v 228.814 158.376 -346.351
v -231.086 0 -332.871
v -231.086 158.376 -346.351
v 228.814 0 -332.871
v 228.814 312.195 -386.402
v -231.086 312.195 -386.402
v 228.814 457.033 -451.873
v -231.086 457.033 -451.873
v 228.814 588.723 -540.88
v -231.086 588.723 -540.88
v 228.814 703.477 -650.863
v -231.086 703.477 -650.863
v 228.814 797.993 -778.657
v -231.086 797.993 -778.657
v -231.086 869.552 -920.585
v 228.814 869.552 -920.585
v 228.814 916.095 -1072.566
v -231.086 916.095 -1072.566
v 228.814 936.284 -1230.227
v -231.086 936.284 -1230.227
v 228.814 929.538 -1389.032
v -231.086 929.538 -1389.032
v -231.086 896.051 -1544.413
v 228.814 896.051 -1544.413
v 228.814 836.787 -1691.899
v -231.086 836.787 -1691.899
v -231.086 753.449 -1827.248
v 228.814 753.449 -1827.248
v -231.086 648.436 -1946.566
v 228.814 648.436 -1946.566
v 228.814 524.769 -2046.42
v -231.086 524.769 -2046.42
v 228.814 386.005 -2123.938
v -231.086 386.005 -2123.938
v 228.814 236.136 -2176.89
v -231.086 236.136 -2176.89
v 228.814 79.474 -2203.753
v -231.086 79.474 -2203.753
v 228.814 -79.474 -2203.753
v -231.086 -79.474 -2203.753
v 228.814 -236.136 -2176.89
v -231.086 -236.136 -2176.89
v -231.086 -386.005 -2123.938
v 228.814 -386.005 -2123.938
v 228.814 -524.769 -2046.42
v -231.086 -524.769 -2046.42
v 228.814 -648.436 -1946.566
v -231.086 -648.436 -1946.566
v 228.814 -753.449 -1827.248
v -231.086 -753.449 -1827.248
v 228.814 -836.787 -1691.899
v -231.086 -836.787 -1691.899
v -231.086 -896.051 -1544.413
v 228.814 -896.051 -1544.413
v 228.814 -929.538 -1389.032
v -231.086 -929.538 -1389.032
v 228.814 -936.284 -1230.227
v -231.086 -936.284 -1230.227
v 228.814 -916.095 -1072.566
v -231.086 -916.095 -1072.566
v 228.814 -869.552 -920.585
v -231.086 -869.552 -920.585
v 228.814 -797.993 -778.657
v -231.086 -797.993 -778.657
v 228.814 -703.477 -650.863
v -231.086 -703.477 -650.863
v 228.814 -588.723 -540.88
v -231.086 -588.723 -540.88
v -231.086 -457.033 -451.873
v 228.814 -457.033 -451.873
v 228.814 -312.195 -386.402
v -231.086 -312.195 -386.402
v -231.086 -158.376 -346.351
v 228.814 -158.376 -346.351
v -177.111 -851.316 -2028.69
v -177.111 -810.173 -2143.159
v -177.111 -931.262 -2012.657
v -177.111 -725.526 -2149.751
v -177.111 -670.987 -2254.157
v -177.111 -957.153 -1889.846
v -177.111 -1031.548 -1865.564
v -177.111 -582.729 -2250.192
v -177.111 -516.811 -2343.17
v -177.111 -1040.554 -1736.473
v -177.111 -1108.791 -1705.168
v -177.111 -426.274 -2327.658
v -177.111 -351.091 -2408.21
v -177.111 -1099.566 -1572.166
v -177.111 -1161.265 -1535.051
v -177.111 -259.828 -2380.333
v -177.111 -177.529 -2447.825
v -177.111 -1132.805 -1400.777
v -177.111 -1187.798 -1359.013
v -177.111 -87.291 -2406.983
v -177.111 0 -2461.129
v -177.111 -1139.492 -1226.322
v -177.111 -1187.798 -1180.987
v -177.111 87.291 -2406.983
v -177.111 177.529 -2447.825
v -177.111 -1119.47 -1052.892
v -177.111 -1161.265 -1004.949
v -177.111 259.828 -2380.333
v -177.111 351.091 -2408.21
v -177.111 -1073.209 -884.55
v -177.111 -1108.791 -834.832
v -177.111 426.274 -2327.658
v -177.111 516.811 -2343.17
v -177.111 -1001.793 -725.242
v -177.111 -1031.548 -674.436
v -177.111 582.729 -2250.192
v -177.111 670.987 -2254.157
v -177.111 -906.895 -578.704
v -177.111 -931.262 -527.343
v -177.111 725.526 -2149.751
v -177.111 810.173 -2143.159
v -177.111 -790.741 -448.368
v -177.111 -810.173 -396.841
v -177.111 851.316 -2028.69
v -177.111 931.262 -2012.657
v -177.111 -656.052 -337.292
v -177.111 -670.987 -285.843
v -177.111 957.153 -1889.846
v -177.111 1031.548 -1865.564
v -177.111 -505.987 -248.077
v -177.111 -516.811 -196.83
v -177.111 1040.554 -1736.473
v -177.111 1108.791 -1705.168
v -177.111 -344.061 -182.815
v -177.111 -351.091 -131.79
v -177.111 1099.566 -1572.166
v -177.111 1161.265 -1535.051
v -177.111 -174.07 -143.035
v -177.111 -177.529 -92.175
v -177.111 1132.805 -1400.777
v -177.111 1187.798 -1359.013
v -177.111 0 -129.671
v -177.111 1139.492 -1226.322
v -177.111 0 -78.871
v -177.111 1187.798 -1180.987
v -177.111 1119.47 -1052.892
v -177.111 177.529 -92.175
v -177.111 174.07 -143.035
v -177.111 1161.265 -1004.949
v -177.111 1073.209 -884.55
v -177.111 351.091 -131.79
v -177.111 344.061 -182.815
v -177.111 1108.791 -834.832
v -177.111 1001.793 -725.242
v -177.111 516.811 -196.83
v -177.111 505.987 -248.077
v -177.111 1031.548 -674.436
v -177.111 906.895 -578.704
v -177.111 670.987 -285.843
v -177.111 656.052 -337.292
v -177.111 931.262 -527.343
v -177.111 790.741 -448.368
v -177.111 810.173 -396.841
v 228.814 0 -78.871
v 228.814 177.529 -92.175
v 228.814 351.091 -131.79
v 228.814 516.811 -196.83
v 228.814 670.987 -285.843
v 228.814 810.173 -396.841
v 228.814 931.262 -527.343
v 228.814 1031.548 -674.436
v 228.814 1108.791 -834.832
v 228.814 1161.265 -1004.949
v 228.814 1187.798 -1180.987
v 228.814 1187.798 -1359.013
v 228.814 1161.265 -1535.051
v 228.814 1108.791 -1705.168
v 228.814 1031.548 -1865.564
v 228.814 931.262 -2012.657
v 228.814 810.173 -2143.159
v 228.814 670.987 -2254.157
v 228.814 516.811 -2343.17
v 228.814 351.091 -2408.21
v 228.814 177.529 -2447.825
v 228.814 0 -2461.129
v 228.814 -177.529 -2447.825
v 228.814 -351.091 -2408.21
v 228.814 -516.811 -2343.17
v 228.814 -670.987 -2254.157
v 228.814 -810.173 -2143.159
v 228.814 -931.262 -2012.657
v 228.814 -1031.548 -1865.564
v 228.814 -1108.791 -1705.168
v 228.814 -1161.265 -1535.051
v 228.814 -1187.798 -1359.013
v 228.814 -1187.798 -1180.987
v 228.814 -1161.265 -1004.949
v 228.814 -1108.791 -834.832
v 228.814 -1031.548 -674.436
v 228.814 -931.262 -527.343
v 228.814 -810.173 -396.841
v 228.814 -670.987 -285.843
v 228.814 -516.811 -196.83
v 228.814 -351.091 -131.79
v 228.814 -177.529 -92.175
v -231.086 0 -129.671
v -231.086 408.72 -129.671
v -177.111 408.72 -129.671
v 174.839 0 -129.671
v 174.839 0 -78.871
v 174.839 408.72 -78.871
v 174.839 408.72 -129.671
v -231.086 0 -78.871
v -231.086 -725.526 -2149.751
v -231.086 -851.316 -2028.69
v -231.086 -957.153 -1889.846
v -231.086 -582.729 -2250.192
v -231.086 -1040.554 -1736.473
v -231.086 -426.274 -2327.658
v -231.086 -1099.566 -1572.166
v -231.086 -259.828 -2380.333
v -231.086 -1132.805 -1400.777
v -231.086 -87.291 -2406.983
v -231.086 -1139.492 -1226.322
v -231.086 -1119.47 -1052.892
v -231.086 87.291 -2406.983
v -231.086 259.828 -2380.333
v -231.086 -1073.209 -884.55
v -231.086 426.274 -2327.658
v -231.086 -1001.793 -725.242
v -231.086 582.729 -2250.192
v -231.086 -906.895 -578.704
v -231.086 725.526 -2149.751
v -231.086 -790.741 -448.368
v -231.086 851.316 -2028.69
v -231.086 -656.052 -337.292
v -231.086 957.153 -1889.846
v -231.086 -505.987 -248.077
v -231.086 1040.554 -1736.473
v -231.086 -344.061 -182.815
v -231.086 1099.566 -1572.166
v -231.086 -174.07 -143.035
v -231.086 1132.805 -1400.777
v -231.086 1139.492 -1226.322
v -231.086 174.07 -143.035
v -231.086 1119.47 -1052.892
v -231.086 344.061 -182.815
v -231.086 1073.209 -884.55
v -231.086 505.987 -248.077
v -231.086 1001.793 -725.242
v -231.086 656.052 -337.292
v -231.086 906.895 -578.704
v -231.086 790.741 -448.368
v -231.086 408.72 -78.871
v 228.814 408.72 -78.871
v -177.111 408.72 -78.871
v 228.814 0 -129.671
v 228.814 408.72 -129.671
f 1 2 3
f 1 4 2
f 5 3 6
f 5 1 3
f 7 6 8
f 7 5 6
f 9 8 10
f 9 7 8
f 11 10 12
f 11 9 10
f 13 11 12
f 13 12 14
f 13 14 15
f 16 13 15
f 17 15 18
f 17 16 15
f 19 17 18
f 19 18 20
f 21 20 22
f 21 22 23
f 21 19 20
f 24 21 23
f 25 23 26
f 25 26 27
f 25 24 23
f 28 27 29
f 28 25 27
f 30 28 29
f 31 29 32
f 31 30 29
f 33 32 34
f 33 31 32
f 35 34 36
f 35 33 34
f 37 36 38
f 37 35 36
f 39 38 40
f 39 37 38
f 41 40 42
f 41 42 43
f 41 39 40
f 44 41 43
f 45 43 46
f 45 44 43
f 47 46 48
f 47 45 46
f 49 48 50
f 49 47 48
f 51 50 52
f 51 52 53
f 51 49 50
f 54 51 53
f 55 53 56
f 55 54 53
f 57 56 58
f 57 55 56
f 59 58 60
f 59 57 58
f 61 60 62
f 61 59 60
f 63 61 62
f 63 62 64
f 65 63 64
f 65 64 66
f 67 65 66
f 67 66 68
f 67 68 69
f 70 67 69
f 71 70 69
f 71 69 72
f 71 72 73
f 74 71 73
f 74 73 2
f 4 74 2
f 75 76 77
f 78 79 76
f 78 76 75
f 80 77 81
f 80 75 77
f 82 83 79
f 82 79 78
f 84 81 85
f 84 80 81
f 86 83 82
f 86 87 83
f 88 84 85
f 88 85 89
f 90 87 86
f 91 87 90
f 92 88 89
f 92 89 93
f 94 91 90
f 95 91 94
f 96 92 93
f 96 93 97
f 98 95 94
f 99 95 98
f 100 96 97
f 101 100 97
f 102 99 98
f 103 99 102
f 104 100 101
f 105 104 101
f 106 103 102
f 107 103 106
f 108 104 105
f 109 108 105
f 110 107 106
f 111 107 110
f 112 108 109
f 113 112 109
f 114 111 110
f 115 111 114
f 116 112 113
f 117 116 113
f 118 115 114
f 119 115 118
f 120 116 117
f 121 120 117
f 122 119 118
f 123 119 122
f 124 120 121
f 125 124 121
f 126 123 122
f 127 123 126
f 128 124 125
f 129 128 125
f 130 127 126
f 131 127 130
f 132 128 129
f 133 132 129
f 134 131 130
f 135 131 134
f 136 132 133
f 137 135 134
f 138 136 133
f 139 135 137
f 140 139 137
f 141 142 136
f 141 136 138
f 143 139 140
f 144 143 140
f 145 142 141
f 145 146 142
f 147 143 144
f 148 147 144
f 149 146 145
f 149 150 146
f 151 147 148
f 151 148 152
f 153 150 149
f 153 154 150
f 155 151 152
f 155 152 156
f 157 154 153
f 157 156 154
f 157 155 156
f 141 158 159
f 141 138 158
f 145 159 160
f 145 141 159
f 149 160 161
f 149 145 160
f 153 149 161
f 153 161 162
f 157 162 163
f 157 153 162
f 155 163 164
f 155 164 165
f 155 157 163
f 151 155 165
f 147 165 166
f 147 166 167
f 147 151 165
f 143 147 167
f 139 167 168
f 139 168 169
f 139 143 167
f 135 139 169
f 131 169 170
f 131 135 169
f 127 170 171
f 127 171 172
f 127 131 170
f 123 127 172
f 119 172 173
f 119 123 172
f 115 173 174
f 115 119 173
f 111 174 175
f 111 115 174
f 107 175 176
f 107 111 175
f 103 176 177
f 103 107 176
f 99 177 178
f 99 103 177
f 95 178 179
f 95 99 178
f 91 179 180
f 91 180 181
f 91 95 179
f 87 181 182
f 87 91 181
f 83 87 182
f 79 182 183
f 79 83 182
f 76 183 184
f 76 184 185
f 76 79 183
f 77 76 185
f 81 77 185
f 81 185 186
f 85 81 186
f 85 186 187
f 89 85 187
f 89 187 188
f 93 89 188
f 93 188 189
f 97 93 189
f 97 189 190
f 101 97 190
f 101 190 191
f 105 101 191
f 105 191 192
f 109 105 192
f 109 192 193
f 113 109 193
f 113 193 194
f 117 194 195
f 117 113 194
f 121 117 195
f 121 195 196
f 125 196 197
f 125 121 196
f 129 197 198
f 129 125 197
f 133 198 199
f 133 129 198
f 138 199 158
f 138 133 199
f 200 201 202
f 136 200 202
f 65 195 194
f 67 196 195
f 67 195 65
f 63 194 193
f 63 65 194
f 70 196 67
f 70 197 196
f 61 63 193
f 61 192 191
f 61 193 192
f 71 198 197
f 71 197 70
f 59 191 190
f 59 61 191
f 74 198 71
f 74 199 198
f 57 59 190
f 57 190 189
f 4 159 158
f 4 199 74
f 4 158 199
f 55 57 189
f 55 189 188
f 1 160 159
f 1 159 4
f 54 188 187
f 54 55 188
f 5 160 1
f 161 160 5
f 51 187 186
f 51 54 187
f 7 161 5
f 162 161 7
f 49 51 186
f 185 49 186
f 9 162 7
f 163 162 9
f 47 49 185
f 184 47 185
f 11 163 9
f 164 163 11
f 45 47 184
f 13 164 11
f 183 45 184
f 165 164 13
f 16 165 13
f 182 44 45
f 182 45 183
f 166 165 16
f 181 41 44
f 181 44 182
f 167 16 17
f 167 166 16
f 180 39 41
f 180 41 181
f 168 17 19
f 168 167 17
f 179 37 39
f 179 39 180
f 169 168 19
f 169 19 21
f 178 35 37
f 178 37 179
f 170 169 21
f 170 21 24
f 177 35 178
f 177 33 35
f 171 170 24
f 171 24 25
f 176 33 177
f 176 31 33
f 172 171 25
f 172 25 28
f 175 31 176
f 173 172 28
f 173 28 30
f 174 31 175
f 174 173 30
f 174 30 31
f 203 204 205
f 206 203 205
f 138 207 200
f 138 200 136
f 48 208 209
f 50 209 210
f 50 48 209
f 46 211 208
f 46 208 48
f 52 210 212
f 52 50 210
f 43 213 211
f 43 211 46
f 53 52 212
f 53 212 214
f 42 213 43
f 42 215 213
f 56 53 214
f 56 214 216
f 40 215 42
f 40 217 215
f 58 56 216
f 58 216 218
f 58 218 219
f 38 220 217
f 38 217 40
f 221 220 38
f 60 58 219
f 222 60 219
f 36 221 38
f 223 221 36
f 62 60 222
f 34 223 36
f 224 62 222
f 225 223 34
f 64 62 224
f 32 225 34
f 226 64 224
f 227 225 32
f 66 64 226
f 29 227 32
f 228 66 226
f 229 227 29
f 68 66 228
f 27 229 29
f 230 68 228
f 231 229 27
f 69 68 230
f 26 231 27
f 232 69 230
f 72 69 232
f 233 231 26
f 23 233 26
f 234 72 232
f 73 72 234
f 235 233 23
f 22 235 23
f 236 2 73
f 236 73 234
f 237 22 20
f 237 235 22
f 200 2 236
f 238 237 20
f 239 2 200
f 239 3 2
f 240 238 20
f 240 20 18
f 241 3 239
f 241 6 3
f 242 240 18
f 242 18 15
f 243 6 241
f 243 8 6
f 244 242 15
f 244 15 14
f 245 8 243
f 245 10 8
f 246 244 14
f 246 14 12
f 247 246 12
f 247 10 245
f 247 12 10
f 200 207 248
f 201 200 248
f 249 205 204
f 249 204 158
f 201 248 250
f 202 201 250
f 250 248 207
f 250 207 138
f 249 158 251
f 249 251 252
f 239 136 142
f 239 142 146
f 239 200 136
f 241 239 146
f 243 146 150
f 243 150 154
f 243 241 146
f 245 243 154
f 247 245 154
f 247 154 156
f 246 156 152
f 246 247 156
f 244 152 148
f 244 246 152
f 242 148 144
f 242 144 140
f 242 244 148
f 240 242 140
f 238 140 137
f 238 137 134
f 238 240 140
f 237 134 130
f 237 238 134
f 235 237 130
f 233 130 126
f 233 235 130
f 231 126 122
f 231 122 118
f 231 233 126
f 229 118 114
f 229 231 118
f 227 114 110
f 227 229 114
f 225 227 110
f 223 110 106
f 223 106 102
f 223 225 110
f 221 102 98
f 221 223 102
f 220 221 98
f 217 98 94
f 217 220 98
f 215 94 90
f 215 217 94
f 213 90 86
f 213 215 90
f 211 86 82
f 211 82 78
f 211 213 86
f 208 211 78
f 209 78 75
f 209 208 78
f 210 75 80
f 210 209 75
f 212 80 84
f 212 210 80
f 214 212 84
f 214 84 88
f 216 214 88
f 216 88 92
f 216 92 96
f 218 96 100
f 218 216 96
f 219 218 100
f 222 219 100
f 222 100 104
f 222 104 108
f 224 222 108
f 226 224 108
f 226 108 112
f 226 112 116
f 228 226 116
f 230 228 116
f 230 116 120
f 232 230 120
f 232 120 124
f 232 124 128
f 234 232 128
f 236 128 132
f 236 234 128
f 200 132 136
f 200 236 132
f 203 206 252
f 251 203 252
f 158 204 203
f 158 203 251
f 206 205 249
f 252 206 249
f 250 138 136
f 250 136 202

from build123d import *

# Parameters (mm, degrees)
F3_W     = 53.975
F3_H     = 408.7201654911
F4_DEPTH = 50.8


# Not quite as in the source:
# - the program builds the solid bodies; features that only make, move or delete a surface that nothing else refers to are left out


with BuildPart() as f4:
    # F3 (on face) → F4 (new body)
    with BuildSketch(Plane.XY.offset(-78.8711753155)):
        with Locations((-204.0980024693, 204.3600827456)):
            Rectangle(F3_W, F3_H)
    extrude(amount=-F4_DEPTH)


with BuildPart() as f4b:
    # F3 (on face) → F4, piece 2 (new body)
    with BuildSketch(Plane.XY.offset(-78.8711753155)):
        with Locations((201.8263277109, 204.3600827456)):
            Rectangle(F3_W, F3_H)
    extrude(amount=-F4_DEPTH)


with BuildPart() as f8:
    # F7 (on face) → F8 (revolve)
    with BuildSketch(Plane.XZ):
        Polygon((228.8138277109, -78.8711753155), (-177.1105024693, -78.8711753155), (-177.1105024693, -129.6711753155), (-231.0855024693, -129.6711753155), (-231.0855024693, -332.8711753155), (228.8138277109, -332.8711753155), align=None)
    revolve(axis=Axis((2.4814261124, 0, -1270), (-1, 0, 0)))


solid = Compound([f4.part, f4b.part, f8.part])
